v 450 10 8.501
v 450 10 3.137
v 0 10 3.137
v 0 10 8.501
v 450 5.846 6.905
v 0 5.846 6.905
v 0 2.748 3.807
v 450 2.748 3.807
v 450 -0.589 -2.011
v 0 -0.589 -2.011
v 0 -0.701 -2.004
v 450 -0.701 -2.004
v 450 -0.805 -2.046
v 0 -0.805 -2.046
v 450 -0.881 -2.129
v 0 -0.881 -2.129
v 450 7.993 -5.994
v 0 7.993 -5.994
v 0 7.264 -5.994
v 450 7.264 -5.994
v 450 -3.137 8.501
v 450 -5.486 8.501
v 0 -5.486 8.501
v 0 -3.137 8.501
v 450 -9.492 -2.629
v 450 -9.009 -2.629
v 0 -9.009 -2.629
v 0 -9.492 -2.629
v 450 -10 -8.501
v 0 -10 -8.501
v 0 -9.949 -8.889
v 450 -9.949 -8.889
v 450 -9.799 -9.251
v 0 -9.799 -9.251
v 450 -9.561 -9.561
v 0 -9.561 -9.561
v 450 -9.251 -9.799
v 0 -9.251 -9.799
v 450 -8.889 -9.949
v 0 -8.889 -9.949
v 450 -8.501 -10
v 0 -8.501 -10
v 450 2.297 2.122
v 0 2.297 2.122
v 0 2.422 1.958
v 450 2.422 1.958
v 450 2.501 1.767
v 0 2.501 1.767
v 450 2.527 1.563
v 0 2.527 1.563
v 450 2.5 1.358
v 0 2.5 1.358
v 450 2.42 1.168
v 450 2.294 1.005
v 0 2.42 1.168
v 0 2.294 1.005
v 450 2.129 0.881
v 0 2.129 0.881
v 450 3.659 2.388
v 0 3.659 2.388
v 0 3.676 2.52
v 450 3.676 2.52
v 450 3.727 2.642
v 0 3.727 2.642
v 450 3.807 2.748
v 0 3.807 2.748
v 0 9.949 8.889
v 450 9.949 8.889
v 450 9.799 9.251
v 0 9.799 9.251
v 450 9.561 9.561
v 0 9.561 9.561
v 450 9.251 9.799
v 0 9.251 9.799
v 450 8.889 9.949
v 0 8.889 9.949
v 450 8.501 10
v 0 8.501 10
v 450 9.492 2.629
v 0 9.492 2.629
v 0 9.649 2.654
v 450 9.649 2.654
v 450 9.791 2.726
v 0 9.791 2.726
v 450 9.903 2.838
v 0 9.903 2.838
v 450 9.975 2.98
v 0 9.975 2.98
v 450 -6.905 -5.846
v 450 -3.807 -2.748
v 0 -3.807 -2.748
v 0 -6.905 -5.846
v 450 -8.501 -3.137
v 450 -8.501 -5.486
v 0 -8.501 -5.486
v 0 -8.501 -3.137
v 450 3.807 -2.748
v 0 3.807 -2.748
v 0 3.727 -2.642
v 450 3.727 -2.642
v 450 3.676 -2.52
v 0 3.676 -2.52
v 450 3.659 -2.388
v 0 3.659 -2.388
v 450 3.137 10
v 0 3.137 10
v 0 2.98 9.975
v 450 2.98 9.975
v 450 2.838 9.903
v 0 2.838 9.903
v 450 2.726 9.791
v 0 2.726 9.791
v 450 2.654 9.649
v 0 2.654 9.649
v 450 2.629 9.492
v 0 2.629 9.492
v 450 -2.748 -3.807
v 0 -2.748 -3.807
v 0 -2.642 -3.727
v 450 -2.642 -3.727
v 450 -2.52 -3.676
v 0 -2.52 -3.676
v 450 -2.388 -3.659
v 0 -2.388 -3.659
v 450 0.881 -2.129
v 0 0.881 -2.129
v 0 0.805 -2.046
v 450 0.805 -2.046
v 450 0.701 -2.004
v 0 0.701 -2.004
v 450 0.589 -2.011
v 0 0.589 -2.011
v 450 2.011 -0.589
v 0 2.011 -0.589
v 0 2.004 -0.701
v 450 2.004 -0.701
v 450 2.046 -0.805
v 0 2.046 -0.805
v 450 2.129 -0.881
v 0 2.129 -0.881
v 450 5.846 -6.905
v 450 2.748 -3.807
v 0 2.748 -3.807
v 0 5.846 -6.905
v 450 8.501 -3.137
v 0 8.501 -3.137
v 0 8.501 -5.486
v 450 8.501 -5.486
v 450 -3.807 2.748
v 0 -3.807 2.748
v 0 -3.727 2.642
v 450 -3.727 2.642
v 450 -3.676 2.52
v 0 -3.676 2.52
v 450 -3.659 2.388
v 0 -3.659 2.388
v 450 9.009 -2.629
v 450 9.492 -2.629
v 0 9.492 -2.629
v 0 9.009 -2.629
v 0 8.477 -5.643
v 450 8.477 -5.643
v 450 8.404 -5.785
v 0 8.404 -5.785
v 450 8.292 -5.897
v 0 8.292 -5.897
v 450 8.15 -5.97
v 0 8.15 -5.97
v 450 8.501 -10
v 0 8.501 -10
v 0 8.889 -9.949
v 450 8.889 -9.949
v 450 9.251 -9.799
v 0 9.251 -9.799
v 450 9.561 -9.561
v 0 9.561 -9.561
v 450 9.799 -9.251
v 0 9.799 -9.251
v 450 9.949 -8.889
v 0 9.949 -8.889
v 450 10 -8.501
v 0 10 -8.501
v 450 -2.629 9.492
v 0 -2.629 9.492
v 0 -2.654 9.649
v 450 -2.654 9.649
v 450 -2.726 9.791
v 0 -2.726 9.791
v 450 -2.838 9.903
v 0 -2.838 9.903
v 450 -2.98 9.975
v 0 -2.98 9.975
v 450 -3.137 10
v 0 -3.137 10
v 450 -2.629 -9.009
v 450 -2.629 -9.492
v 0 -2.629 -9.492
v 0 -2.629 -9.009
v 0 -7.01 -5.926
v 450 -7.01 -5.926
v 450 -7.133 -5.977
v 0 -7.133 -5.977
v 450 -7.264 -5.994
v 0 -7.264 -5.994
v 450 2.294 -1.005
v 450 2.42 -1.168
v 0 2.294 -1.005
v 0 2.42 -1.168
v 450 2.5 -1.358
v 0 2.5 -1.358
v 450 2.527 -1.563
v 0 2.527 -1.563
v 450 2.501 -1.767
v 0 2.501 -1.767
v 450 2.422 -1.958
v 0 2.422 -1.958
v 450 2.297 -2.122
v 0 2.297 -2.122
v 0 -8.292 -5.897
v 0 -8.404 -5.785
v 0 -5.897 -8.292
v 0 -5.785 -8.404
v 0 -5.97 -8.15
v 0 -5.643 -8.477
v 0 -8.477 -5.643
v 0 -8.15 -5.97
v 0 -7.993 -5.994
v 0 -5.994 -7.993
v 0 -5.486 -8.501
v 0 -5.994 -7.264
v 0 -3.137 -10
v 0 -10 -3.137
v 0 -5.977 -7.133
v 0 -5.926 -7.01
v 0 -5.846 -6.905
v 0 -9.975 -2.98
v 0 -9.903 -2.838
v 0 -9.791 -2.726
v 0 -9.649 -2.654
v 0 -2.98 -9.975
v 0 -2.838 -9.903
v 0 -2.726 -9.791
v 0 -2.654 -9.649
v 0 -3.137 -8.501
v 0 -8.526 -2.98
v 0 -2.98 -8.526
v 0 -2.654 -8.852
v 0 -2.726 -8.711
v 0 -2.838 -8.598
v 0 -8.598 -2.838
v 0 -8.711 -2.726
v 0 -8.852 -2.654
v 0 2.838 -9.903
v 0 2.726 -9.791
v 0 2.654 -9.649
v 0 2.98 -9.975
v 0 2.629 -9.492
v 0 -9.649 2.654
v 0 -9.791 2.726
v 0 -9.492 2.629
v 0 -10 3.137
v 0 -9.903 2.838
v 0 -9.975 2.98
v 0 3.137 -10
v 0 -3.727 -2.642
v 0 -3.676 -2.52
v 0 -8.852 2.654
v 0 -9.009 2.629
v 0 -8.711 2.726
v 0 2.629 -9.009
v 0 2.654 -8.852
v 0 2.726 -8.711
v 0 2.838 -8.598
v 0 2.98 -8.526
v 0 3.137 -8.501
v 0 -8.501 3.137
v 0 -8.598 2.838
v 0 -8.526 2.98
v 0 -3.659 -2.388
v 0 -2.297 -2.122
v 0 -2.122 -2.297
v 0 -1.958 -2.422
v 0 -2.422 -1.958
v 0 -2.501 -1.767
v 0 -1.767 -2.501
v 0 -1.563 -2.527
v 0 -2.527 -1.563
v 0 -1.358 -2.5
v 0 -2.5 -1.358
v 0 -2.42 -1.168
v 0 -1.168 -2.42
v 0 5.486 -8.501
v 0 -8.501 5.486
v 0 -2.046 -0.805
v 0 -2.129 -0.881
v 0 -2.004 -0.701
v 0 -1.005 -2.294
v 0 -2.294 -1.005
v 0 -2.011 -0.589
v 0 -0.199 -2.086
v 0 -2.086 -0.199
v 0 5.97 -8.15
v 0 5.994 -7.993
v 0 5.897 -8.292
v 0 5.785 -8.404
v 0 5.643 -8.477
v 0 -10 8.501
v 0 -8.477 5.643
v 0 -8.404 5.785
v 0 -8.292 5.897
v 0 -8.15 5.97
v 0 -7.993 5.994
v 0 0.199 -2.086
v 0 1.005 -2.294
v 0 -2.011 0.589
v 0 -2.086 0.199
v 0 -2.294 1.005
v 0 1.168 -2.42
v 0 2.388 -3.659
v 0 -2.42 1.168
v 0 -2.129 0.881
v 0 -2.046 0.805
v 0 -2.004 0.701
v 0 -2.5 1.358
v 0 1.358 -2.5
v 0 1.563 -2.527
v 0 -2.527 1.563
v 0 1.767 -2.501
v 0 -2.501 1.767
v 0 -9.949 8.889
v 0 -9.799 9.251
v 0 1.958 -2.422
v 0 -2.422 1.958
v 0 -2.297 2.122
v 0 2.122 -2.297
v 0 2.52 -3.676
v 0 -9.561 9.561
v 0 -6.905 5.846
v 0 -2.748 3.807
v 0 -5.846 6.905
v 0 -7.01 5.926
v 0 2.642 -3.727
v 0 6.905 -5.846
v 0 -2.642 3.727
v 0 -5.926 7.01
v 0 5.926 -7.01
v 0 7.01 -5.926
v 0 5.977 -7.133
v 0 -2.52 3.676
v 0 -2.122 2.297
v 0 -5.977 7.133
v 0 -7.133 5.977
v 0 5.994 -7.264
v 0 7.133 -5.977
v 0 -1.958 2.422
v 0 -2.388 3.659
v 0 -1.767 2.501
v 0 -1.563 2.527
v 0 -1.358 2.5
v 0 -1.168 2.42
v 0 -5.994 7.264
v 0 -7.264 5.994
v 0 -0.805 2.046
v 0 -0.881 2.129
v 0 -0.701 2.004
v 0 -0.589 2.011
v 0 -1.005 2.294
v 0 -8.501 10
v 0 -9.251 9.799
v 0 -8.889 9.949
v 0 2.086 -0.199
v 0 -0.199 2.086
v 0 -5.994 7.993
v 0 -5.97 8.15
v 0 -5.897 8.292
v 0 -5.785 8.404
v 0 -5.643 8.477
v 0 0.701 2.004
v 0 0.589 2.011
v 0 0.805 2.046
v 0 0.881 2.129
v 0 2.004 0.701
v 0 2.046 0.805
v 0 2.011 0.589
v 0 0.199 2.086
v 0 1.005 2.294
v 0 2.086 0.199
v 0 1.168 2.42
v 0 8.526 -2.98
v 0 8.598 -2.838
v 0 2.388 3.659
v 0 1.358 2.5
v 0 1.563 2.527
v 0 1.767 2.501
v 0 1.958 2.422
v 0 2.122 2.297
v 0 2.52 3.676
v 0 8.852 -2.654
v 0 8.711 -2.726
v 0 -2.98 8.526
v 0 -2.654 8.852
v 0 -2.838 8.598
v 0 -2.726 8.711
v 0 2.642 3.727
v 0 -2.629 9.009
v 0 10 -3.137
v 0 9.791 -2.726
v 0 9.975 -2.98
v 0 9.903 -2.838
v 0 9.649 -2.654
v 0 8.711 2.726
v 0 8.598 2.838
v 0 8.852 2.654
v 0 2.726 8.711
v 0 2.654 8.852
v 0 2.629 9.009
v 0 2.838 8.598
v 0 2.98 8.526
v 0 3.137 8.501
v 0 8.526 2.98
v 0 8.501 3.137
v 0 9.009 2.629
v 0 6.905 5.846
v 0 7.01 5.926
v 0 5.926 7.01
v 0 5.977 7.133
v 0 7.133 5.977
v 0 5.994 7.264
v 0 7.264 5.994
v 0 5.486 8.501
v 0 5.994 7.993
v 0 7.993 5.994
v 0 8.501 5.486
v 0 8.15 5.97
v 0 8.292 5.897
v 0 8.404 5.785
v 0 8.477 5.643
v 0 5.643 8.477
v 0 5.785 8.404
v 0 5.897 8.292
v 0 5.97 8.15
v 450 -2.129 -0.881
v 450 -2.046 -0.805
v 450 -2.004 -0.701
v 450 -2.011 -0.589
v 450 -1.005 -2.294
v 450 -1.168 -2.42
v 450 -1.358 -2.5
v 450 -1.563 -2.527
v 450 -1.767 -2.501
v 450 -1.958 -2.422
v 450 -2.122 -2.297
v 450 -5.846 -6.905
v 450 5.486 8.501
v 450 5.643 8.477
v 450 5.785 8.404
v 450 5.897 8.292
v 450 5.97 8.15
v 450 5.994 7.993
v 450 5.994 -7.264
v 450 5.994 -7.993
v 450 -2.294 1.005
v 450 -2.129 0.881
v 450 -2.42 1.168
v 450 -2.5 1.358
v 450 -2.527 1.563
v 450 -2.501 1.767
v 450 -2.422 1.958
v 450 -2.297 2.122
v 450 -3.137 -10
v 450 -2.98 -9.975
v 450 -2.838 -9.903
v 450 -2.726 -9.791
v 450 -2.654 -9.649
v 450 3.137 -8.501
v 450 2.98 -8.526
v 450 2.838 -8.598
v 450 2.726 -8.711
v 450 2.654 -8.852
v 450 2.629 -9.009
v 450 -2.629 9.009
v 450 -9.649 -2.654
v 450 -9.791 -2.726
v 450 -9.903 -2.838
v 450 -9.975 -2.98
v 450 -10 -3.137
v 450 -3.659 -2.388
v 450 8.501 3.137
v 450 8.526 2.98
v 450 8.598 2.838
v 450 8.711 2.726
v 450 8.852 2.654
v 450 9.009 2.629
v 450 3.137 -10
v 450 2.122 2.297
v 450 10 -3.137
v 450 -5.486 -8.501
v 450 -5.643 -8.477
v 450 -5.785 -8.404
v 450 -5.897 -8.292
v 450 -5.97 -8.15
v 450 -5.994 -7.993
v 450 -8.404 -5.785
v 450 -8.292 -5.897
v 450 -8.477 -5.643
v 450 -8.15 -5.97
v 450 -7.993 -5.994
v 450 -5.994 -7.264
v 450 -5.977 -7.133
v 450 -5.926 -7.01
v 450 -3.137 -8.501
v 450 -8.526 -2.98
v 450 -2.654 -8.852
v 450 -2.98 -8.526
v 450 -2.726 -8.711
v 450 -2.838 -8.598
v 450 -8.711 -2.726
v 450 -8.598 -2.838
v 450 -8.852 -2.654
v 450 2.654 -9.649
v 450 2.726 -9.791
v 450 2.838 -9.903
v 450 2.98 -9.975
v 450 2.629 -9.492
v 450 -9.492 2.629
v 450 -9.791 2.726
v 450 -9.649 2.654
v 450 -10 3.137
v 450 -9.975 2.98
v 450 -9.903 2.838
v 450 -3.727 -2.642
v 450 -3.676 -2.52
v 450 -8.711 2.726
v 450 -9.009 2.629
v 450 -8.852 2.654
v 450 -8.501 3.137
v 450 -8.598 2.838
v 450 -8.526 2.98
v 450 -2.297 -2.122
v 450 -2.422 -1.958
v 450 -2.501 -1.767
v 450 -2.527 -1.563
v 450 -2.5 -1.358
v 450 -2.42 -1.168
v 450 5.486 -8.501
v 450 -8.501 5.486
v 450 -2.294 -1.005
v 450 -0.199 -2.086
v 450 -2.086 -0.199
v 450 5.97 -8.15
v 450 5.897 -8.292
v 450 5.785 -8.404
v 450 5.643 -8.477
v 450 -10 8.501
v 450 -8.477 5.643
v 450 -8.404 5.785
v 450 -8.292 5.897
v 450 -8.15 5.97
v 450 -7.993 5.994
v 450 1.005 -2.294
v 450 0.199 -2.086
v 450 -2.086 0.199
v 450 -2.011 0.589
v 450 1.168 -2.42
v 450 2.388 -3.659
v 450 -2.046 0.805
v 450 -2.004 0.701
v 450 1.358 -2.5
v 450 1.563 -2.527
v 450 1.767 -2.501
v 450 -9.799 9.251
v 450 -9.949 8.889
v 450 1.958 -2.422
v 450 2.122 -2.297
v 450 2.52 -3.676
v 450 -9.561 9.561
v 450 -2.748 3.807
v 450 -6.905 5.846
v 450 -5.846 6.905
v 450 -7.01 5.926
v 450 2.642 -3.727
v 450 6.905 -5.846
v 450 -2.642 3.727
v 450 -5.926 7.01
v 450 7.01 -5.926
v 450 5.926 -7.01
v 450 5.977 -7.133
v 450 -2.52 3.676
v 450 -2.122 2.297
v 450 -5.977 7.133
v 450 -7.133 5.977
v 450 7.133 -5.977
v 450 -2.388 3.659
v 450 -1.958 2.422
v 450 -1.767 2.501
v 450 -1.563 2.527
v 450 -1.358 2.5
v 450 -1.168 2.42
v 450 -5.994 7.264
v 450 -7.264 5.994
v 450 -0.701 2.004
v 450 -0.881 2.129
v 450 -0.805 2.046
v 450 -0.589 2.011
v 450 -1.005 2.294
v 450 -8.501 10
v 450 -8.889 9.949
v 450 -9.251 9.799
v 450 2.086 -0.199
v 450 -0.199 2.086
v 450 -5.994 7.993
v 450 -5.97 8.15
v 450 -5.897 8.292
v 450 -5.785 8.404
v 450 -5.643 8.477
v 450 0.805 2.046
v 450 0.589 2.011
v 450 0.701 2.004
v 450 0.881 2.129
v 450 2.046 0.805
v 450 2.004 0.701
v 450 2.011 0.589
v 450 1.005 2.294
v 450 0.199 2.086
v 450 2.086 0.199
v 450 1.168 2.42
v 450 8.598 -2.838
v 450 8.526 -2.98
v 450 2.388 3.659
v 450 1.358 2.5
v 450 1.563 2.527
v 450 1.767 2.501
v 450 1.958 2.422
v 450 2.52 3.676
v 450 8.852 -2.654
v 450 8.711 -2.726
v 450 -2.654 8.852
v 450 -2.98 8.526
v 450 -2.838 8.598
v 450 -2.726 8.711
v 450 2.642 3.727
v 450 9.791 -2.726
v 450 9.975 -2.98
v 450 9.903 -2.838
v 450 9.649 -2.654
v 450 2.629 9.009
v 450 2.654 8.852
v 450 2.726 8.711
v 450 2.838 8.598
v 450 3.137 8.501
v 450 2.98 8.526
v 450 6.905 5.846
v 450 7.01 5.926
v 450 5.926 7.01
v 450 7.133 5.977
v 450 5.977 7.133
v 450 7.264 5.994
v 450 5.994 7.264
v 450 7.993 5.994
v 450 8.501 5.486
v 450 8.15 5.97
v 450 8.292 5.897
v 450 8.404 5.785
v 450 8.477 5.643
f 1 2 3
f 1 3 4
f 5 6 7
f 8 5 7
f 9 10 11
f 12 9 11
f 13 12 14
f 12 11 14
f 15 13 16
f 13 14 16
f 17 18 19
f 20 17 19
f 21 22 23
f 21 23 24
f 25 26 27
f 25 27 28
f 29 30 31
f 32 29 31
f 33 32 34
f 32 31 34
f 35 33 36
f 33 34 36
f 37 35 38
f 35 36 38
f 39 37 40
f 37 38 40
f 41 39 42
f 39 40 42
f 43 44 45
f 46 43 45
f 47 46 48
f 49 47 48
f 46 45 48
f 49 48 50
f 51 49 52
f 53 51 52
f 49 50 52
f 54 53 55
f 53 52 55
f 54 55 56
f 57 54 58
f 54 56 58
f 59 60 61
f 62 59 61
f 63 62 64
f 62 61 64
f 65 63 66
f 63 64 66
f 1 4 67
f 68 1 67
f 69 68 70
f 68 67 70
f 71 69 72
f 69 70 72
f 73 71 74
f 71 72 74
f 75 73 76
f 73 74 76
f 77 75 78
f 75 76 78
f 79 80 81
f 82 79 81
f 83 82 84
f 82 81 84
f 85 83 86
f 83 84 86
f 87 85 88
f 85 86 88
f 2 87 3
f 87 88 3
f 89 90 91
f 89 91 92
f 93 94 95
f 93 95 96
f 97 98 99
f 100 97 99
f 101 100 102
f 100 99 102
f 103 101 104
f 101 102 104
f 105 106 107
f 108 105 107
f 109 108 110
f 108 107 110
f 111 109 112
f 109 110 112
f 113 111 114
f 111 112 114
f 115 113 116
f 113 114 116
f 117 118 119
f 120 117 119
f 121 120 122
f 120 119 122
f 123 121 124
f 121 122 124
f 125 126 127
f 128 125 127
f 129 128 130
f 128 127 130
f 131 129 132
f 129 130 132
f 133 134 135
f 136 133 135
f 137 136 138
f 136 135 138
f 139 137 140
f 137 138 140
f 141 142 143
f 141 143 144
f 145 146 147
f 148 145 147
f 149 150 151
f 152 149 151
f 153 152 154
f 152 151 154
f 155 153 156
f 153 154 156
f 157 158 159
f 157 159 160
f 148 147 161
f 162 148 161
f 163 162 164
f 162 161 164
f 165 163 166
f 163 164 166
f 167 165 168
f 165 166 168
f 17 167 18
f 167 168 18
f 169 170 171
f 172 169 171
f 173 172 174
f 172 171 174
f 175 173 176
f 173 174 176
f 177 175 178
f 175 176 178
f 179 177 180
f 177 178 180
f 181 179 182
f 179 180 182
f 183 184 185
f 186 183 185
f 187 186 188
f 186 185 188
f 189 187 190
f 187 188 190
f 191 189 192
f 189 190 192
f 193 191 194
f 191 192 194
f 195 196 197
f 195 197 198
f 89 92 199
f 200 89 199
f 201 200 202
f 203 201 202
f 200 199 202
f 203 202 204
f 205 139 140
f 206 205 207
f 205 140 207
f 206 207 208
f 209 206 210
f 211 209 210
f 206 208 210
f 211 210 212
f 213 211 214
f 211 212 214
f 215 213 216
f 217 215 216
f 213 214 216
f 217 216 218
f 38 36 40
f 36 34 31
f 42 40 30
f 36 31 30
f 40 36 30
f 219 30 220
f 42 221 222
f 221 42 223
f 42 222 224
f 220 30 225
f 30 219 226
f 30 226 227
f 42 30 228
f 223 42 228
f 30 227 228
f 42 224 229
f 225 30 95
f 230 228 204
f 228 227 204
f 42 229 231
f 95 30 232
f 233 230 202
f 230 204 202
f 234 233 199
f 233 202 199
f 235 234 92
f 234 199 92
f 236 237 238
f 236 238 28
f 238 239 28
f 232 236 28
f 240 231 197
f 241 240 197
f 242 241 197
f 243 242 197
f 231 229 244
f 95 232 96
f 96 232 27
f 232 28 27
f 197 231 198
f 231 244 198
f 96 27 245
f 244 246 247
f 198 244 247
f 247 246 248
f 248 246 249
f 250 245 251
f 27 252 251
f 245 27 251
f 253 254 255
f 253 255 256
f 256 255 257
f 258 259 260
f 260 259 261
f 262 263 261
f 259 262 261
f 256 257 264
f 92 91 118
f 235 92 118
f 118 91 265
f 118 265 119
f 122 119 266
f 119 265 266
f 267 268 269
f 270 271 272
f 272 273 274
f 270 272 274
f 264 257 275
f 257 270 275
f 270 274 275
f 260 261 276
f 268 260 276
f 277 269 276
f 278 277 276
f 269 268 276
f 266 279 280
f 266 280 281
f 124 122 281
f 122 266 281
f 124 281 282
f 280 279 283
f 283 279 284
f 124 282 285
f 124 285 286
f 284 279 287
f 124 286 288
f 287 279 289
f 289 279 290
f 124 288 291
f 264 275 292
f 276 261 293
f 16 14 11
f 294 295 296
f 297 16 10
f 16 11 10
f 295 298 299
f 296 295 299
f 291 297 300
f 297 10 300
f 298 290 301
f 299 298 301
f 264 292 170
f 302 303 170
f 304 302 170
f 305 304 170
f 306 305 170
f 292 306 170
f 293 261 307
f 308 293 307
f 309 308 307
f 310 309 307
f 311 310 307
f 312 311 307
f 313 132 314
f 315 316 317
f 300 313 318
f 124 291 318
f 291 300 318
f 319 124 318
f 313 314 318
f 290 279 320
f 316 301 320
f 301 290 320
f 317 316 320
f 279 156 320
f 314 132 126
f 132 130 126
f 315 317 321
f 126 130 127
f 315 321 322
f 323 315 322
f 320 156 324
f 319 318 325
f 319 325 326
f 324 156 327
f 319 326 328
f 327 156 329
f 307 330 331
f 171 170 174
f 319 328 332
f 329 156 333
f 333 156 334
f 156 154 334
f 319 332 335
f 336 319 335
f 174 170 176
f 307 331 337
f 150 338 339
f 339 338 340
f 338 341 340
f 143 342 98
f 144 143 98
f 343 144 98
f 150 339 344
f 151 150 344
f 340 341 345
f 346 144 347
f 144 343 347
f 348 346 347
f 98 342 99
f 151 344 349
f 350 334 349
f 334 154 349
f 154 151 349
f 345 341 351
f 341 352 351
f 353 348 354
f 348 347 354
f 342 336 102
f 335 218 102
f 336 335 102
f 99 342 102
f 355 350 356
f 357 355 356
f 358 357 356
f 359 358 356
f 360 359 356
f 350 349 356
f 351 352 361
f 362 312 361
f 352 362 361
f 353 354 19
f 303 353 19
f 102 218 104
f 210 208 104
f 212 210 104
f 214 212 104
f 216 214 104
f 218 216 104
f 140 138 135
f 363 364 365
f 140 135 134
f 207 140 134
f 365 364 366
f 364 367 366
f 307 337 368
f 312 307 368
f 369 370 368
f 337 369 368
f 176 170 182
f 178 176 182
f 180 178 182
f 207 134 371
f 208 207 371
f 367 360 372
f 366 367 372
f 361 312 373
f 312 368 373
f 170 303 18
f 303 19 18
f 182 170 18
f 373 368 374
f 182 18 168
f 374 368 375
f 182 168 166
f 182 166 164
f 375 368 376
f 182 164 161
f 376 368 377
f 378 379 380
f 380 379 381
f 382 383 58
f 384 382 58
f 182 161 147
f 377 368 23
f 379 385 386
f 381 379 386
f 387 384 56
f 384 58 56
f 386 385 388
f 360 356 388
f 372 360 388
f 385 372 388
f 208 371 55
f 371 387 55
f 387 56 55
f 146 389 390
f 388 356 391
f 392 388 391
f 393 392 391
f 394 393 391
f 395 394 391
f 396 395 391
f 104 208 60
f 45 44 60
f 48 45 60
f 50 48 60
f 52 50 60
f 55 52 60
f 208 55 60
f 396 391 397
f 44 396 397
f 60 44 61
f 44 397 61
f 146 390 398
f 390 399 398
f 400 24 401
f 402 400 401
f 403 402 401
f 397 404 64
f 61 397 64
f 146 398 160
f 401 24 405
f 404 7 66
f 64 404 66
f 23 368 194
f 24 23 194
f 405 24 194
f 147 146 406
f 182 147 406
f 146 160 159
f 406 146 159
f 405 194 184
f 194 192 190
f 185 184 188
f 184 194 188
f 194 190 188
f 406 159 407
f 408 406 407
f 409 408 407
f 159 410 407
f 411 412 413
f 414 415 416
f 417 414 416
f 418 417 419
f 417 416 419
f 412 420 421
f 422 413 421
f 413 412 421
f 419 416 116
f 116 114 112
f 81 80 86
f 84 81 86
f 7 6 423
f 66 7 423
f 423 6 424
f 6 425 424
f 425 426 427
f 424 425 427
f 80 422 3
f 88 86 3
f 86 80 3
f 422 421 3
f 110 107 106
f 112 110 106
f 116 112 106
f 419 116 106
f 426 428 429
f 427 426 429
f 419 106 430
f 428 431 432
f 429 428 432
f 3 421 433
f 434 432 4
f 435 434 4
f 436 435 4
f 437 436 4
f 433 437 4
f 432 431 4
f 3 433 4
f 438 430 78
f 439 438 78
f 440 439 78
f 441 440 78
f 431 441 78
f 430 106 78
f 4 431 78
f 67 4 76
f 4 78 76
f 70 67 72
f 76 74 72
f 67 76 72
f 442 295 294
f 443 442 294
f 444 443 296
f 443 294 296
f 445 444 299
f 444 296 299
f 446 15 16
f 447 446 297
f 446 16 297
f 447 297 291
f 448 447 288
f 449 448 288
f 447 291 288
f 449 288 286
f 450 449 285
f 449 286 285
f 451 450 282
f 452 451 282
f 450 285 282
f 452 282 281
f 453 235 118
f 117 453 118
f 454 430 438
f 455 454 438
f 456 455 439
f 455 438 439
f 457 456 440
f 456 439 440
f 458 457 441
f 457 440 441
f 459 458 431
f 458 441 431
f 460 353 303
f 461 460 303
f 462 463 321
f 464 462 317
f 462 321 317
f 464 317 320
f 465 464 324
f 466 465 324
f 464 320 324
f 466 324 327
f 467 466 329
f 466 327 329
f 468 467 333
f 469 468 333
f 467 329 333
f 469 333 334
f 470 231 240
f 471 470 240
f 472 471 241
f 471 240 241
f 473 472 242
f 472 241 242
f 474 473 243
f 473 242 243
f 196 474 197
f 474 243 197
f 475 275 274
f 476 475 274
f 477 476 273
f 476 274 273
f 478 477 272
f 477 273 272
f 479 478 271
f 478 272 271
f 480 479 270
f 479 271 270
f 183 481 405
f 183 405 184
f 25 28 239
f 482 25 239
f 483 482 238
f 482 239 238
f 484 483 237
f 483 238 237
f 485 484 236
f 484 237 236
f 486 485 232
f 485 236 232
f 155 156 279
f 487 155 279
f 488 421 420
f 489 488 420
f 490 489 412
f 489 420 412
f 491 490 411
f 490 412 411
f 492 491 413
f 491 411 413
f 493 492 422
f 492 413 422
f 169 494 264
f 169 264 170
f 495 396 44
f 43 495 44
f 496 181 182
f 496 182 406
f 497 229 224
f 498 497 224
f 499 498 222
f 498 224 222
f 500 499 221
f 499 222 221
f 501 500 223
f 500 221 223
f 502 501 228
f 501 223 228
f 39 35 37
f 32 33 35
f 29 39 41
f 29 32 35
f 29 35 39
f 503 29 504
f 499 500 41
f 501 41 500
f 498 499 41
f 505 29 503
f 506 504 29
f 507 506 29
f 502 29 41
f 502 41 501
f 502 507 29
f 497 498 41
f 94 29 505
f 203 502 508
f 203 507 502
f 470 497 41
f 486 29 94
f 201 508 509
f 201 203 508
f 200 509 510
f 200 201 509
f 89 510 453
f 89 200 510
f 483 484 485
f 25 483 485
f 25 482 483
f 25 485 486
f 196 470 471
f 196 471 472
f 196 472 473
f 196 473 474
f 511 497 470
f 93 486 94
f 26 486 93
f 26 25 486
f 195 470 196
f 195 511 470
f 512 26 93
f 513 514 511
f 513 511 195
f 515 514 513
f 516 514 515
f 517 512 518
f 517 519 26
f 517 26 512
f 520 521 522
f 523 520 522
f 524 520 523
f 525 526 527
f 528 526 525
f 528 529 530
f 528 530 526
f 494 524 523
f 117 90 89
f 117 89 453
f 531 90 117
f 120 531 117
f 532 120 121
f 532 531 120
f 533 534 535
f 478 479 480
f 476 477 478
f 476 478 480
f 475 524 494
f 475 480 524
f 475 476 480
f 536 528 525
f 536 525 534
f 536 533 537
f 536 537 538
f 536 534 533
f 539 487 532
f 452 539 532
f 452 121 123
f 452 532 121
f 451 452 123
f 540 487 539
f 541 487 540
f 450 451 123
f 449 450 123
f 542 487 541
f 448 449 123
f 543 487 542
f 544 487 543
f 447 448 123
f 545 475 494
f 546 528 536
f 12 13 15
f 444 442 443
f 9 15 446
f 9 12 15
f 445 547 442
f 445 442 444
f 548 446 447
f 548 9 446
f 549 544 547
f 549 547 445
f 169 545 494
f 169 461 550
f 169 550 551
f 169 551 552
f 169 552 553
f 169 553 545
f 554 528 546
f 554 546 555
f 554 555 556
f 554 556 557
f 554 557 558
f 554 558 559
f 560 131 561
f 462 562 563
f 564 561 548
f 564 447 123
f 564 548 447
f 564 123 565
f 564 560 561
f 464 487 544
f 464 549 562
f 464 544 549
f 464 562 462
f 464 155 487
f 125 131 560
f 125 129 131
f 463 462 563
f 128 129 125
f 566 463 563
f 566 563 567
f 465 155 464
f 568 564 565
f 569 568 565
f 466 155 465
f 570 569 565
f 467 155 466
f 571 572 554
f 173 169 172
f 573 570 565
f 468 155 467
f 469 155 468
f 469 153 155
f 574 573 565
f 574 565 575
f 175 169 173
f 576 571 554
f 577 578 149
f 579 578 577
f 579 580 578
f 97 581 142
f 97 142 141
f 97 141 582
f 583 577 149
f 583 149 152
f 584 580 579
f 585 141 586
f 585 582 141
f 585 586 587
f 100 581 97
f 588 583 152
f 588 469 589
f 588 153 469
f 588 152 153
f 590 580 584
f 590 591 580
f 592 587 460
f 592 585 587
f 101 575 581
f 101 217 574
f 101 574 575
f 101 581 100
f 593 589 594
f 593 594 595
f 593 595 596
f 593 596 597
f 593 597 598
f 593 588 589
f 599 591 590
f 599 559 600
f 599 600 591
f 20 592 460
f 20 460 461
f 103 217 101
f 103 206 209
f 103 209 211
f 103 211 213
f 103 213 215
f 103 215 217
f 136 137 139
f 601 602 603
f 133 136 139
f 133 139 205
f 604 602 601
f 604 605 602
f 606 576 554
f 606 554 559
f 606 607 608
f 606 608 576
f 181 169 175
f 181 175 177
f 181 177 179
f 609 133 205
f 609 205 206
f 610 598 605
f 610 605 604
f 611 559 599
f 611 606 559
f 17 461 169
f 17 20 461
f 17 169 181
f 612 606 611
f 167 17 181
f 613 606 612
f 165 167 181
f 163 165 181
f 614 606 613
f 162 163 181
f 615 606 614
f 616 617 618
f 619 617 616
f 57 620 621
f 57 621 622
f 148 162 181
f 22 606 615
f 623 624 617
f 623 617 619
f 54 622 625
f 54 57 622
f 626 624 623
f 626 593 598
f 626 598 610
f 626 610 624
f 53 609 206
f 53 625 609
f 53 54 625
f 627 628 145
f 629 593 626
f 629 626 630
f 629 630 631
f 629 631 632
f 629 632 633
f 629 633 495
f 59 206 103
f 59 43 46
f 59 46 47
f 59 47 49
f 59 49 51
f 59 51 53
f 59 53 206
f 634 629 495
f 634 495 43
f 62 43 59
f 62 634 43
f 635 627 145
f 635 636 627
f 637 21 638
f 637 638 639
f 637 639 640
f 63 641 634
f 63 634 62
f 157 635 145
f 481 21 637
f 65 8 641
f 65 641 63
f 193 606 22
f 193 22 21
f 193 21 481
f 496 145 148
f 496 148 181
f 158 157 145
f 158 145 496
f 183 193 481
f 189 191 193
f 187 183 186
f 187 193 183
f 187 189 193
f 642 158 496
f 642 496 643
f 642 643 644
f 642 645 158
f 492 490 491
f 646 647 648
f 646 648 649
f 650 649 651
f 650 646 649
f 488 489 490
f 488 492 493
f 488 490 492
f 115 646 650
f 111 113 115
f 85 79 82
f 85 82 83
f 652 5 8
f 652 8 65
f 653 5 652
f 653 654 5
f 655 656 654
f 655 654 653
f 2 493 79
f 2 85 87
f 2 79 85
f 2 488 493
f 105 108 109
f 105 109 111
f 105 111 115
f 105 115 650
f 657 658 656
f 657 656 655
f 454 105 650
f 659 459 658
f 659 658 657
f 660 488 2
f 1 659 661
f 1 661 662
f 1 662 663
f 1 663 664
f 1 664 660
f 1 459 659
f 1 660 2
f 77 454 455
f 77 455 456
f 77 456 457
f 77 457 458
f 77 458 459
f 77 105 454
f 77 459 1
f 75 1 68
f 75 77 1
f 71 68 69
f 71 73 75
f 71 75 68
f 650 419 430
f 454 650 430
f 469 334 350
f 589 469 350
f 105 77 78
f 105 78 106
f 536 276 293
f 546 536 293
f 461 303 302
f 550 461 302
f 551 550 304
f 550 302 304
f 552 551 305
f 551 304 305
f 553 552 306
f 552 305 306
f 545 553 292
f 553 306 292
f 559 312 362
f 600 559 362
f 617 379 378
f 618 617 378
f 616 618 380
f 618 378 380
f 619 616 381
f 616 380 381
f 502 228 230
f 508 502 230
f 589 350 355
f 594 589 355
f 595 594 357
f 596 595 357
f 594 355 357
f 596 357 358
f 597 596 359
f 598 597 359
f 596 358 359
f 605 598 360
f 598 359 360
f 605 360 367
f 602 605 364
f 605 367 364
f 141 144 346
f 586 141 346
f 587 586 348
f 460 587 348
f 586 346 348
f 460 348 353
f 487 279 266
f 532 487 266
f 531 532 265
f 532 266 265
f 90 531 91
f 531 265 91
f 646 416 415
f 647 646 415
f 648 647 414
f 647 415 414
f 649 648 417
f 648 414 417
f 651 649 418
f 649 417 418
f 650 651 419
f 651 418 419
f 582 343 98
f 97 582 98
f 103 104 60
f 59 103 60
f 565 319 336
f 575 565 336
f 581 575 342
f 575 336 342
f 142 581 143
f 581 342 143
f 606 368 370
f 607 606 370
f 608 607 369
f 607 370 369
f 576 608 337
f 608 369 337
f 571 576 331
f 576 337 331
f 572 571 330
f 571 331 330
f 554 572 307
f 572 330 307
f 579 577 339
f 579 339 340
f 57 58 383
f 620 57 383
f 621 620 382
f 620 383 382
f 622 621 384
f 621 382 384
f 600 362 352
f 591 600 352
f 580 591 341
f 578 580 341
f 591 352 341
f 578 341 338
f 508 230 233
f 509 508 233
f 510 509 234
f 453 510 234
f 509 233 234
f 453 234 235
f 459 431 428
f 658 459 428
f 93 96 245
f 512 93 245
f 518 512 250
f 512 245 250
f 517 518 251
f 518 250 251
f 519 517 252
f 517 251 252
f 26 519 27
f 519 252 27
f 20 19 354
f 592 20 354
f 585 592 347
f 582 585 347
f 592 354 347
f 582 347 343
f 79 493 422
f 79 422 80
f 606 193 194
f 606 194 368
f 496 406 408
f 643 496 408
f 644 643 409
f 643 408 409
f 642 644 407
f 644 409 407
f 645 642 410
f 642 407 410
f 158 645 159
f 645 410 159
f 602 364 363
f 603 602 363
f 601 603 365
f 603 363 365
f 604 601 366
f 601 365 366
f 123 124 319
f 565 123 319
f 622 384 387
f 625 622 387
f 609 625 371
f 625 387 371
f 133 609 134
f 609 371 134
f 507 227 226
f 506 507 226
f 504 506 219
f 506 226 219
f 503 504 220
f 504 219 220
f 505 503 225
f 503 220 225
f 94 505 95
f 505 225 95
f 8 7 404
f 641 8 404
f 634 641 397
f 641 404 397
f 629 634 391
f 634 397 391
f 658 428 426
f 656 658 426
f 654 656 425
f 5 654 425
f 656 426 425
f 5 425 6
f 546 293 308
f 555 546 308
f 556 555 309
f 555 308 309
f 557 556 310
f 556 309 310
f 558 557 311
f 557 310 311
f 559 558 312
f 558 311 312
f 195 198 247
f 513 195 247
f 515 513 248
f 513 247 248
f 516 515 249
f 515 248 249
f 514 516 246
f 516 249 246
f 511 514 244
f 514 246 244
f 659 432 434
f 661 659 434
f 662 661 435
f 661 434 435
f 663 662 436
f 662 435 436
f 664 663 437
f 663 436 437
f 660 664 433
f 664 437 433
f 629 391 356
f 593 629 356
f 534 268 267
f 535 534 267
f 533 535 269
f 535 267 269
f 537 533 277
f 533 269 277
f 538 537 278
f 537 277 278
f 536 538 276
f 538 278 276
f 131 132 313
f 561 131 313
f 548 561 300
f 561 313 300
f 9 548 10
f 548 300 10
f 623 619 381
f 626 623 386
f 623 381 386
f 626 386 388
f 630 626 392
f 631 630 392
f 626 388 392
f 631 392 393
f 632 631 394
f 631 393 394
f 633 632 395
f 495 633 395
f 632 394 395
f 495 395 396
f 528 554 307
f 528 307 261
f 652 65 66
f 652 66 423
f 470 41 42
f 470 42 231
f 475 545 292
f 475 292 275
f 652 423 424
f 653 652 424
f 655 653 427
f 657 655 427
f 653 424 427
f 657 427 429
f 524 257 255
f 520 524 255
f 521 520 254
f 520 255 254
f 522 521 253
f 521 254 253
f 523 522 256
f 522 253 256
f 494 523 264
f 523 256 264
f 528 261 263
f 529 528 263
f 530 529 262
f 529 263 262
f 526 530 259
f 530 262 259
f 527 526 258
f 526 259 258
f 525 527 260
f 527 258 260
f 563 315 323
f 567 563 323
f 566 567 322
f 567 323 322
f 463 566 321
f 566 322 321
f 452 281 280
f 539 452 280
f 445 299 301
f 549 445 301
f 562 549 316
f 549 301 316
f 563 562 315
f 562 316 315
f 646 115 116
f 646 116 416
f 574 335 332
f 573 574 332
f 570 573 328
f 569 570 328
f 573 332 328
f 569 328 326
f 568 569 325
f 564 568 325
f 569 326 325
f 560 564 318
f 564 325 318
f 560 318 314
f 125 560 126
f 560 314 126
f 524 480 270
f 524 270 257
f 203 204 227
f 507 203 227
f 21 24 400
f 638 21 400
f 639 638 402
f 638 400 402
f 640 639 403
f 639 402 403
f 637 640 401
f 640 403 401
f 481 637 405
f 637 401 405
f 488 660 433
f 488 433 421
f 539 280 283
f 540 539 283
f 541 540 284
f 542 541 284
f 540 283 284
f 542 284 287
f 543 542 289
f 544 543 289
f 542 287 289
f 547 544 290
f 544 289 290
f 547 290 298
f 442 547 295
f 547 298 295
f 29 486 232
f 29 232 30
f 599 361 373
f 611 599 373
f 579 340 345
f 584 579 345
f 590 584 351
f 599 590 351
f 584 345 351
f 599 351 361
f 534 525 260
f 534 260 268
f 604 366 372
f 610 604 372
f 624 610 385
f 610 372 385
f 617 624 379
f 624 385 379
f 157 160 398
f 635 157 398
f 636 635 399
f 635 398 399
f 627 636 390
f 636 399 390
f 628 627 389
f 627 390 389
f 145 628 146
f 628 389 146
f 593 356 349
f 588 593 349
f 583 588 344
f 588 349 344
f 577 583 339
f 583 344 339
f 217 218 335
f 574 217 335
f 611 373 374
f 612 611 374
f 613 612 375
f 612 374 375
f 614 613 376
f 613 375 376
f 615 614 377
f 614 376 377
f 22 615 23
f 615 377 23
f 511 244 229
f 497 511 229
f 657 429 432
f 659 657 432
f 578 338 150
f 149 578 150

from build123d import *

# Parameters (mm, degrees)
F_20_SERIES_20_2020_1_DEPTH = 450


with BuildPart() as part:
    # Sketch11 → 20_series 20-2020(1) (new body)
    with BuildSketch(Plane.YZ):
        with BuildLine():
            Line((9.0094, 2.6289), (9.492, 2.6289))
            ThreePointArc((9.492, 2.6289), (9.851210245, 2.777689755), (10, 3.1369))
            Line((10, 3.1369), (10, 8.5014))
            ThreePointArc((10, 8.5014), (9.561070222, 9.561070222), (8.5014, 10))
            Line((8.5014, 10), (3.1369, 10))
            ThreePointArc((3.1369, 10), (2.777689755, 9.851210245), (2.6289, 9.492))
            Line((2.6289, 9.492), (2.6289, 9.0094))
            ThreePointArc((2.6289, 9.0094), (2.777689755, 8.650189755), (3.1369, 8.5014))
            Line((3.1369, 8.5014), (5.4864, 8.5014))
            ThreePointArc((5.4864, 8.5014), (5.845610245, 8.352610245), (5.9944, 7.9934))
            Line((5.9944, 7.9934), (5.9944, 7.264490712))
            ThreePointArc((5.9944, 7.264490712), (5.955730803, 7.070087528), (5.845610245, 6.905280467))
            Line((5.845610245, 6.905280467), (2.747686782, 3.807357004))
            ThreePointArc((2.747686782, 3.807357004), (2.582879721, 3.697236446), (2.388476537, 3.658567249))
            Line((2.388476537, 3.658567249), (-2.388476537, 3.658567249))
            ThreePointArc((-2.388476537, 3.658567249), (-2.582879721, 3.697236446), (-2.747686782, 3.807357004))
            Line((-2.747686782, 3.807357004), (-5.845610245, 6.905280467))
            ThreePointArc((-5.845610245, 6.905280467), (-5.955730803, 7.070087528), (-5.9944, 7.264490712))
            Line((-5.9944, 7.264490712), (-5.9944, 7.9934))
            ThreePointArc((-5.9944, 7.9934), (-5.845610245, 8.352610245), (-5.4864, 8.5014))
            Line((-5.4864, 8.5014), (-3.1369, 8.5014))
            ThreePointArc((-3.1369, 8.5014), (-2.777689755, 8.650189755), (-2.6289, 9.0094))
            Line((-2.6289, 9.0094), (-2.6289, 9.492))
            ThreePointArc((-2.6289, 9.492), (-2.777689755, 9.851210245), (-3.1369, 10))
            Line((-3.1369, 10), (-8.5014, 10))
            ThreePointArc((-8.5014, 10), (-9.561070222, 9.561070222), (-10, 8.5014))
            Line((-10, 8.5014), (-10, 3.1369))
            ThreePointArc((-10, 3.1369), (-9.851210245, 2.777689755), (-9.492, 2.6289))
            Line((-9.492, 2.6289), (-9.0094, 2.6289))
            ThreePointArc((-9.0094, 2.6289), (-8.650189755, 2.777689755), (-8.5014, 3.1369))
            Line((-8.5014, 3.1369), (-8.5014, 5.4864))
            ThreePointArc((-8.5014, 5.4864), (-8.352610245, 5.845610245), (-7.9934, 5.9944))
            Line((-7.9934, 5.9944), (-7.264490712, 5.9944))
            ThreePointArc((-7.264490712, 5.9944), (-7.070087528, 5.955730803), (-6.905280467, 5.845610245))
            Line((-6.905280467, 5.845610245), (-3.807357004, 2.747686782))
            ThreePointArc((-3.807357004, 2.747686782), (-3.697236446, 2.582879721), (-3.658567249, 2.388476537))
            Line((-3.658567249, 2.388476537), (-3.658567249, -2.388476537))
            ThreePointArc((-3.658567249, -2.388476537), (-3.697236446, -2.582879721), (-3.807357004, -2.747686782))
            Line((-3.807357004, -2.747686782), (-6.905280467, -5.845610245))
            ThreePointArc((-6.905280467, -5.845610245), (-7.070087528, -5.955730803), (-7.264490712, -5.9944))
            Line((-7.264490712, -5.9944), (-7.9934, -5.9944))
            ThreePointArc((-7.9934, -5.9944), (-8.352610245, -5.845610245), (-8.5014, -5.4864))
            Line((-8.5014, -5.4864), (-8.5014, -3.1369))
            ThreePointArc((-8.5014, -3.1369), (-8.650189755, -2.777689755), (-9.0094, -2.6289))
            Line((-9.0094, -2.6289), (-9.492, -2.6289))
            ThreePointArc((-9.492, -2.6289), (-9.851210245, -2.777689755), (-10, -3.1369))
            Line((-10, -3.1369), (-10, -8.5014))
            ThreePointArc((-10, -8.5014), (-9.561070222, -9.561070222), (-8.5014, -10))
            Line((-8.5014, -10), (-3.1369, -10))
            ThreePointArc((-3.1369, -10), (-2.777689755, -9.851210245), (-2.6289, -9.492))
            Line((-2.6289, -9.492), (-2.6289, -9.0094))
            ThreePointArc((-2.6289, -9.0094), (-2.777689755, -8.650189755), (-3.1369, -8.5014))
            Line((-3.1369, -8.5014), (-5.4864, -8.5014))
            ThreePointArc((-5.4864, -8.5014), (-5.845610245, -8.352610245), (-5.9944, -7.9934))
            Line((-5.9944, -7.9934), (-5.9944, -7.264490712))
            ThreePointArc((-5.9944, -7.264490712), (-5.955730803, -7.070087528), (-5.845610245, -6.905280467))
            Line((-5.845610245, -6.905280467), (-2.747686782, -3.807357004))
            ThreePointArc((-2.747686782, -3.807357004), (-2.582879721, -3.697236446), (-2.388476537, -3.658567249))
            Line((-2.388476537, -3.658567249), (2.388476537, -3.658567249))
            ThreePointArc((2.388476537, -3.658567249), (2.582879721, -3.697236446), (2.747686782, -3.807357004))
            Line((2.747686782, -3.807357004), (5.845610245, -6.905280467))
            ThreePointArc((5.845610245, -6.905280467), (5.955730803, -7.070087528), (5.9944, -7.264490712))
            Line((5.9944, -7.264490712), (5.9944, -7.9934))
            ThreePointArc((5.9944, -7.9934), (5.845610245, -8.352610245), (5.4864, -8.5014))
            Line((5.4864, -8.5014), (3.1369, -8.5014))
            ThreePointArc((3.1369, -8.5014), (2.777689755, -8.650189755), (2.6289, -9.0094))
            Line((2.6289, -9.0094), (2.6289, -9.492))
            ThreePointArc((2.6289, -9.492), (2.777689755, -9.851210245), (3.1369, -10))
            Line((3.1369, -10), (8.5014, -10))
            ThreePointArc((8.5014, -10), (9.561070222, -9.561070222), (10, -8.5014))
            Line((10, -8.5014), (10, -3.1369))
            ThreePointArc((10, -3.1369), (9.851210245, -2.777689755), (9.492, -2.6289))
            Line((9.492, -2.6289), (9.0094, -2.6289))
            ThreePointArc((9.0094, -2.6289), (8.650189755, -2.777689755), (8.5014, -3.1369))
            Line((8.5014, -3.1369), (8.5014, -5.4864))
            ThreePointArc((8.5014, -5.4864), (8.352610245, -5.845610245), (7.9934, -5.9944))
            Line((7.9934, -5.9944), (7.264490712, -5.9944))
            ThreePointArc((7.264490712, -5.9944), (7.070087528, -5.955730803), (6.905280467, -5.845610245))
            Line((6.905280467, -5.845610245), (3.807357004, -2.747686782))
            ThreePointArc((3.807357004, -2.747686782), (3.697236446, -2.582879721), (3.658567249, -2.388476537))
            Line((3.658567249, -2.388476537), (3.658567249, 2.388476537))
            ThreePointArc((3.658567249, 2.388476537), (3.697236446, 2.582879721), (3.807357004, 2.747686782))
            Line((3.807357004, 2.747686782), (6.905280467, 5.845610245))
            ThreePointArc((6.905280467, 5.845610245), (7.070087528, 5.955730803), (7.264490712, 5.9944))
            Line((7.264490712, 5.9944), (7.9934, 5.9944))
            ThreePointArc((7.9934, 5.9944), (8.352610245, 5.845610245), (8.5014, 5.4864))
            Line((8.5014, 5.4864), (8.5014, 3.1369))
            ThreePointArc((8.5014, 3.1369), (8.650189755, 2.777689755), (9.0094, 2.6289))
        make_face()
        with BuildLine():
            Line((-2.296558466, 2.121727546), (-2.121727546, 2.296558466))
            ThreePointArc((-2.121727546, 2.296558466), (-1.459775814, 2.520126613), (-0.880635441, 2.129282347))
            ThreePointArc((-0.880635441, 2.129282347), (-0.755121693, 2.019456424), (-0.588548999, 2.011151493))
            ThreePointArc((-0.588548999, 2.011151493), (0, 2.0955), (0.588548999, 2.011151493))
            ThreePointArc((0.588548999, 2.011151493), (0.755121693, 2.019456424), (0.880635441, 2.129282347))
            ThreePointArc((0.880635441, 2.129282347), (1.459775814, 2.520126613), (2.121727546, 2.296558466))
            Line((2.121727546, 2.296558466), (2.296558466, 2.121727546))
            ThreePointArc((2.296558466, 2.121727546), (2.520126613, 1.459775814), (2.129282347, 0.880635441))
            ThreePointArc((2.129282347, 0.880635441), (2.019456424, 0.755121693), (2.011151493, 0.588548999))
            ThreePointArc((2.011151493, 0.588548999), (2.0955, 0), (2.011151493, -0.588548999))
            ThreePointArc((2.011151493, -0.588548999), (2.019456424, -0.755121693), (2.129282347, -0.880635441))
            ThreePointArc((2.129282347, -0.880635441), (2.520126613, -1.459775814), (2.296558466, -2.121727546))
            Line((2.296558466, -2.121727546), (2.121727546, -2.296558466))
            ThreePointArc((2.121727546, -2.296558466), (1.459775814, -2.520126613), (0.880635441, -2.129282347))
            ThreePointArc((0.880635441, -2.129282347), (0.755121693, -2.019456424), (0.588548999, -2.011151493))
            ThreePointArc((0.588548999, -2.011151493), (0, -2.0955), (-0.588548999, -2.011151493))
            ThreePointArc((-0.588548999, -2.011151493), (-0.755121693, -2.019456424), (-0.880635441, -2.129282347))
            ThreePointArc((-0.880635441, -2.129282347), (-1.459775814, -2.520126613), (-2.121727546, -2.296558466))
            Line((-2.121727546, -2.296558466), (-2.296558466, -2.121727546))
            ThreePointArc((-2.296558466, -2.121727546), (-2.520126613, -1.459775814), (-2.129282347, -0.880635441))
            ThreePointArc((-2.129282347, -0.880635441), (-2.019456424, -0.755121693), (-2.011151493, -0.588548999))
            ThreePointArc((-2.011151493, -0.588548999), (-2.0955, 0), (-2.011151493, 0.588548999))
            ThreePointArc((-2.011151493, 0.588548999), (-2.019456424, 0.755121693), (-2.129282347, 0.880635441))
            ThreePointArc((-2.129282347, 0.880635441), (-2.520126613, 1.459775814), (-2.296558466, 2.121727546))
        make_face(mode=Mode.SUBTRACT)
    extrude(amount=F_20_SERIES_20_2020_1_DEPTH)


solid = part.part
